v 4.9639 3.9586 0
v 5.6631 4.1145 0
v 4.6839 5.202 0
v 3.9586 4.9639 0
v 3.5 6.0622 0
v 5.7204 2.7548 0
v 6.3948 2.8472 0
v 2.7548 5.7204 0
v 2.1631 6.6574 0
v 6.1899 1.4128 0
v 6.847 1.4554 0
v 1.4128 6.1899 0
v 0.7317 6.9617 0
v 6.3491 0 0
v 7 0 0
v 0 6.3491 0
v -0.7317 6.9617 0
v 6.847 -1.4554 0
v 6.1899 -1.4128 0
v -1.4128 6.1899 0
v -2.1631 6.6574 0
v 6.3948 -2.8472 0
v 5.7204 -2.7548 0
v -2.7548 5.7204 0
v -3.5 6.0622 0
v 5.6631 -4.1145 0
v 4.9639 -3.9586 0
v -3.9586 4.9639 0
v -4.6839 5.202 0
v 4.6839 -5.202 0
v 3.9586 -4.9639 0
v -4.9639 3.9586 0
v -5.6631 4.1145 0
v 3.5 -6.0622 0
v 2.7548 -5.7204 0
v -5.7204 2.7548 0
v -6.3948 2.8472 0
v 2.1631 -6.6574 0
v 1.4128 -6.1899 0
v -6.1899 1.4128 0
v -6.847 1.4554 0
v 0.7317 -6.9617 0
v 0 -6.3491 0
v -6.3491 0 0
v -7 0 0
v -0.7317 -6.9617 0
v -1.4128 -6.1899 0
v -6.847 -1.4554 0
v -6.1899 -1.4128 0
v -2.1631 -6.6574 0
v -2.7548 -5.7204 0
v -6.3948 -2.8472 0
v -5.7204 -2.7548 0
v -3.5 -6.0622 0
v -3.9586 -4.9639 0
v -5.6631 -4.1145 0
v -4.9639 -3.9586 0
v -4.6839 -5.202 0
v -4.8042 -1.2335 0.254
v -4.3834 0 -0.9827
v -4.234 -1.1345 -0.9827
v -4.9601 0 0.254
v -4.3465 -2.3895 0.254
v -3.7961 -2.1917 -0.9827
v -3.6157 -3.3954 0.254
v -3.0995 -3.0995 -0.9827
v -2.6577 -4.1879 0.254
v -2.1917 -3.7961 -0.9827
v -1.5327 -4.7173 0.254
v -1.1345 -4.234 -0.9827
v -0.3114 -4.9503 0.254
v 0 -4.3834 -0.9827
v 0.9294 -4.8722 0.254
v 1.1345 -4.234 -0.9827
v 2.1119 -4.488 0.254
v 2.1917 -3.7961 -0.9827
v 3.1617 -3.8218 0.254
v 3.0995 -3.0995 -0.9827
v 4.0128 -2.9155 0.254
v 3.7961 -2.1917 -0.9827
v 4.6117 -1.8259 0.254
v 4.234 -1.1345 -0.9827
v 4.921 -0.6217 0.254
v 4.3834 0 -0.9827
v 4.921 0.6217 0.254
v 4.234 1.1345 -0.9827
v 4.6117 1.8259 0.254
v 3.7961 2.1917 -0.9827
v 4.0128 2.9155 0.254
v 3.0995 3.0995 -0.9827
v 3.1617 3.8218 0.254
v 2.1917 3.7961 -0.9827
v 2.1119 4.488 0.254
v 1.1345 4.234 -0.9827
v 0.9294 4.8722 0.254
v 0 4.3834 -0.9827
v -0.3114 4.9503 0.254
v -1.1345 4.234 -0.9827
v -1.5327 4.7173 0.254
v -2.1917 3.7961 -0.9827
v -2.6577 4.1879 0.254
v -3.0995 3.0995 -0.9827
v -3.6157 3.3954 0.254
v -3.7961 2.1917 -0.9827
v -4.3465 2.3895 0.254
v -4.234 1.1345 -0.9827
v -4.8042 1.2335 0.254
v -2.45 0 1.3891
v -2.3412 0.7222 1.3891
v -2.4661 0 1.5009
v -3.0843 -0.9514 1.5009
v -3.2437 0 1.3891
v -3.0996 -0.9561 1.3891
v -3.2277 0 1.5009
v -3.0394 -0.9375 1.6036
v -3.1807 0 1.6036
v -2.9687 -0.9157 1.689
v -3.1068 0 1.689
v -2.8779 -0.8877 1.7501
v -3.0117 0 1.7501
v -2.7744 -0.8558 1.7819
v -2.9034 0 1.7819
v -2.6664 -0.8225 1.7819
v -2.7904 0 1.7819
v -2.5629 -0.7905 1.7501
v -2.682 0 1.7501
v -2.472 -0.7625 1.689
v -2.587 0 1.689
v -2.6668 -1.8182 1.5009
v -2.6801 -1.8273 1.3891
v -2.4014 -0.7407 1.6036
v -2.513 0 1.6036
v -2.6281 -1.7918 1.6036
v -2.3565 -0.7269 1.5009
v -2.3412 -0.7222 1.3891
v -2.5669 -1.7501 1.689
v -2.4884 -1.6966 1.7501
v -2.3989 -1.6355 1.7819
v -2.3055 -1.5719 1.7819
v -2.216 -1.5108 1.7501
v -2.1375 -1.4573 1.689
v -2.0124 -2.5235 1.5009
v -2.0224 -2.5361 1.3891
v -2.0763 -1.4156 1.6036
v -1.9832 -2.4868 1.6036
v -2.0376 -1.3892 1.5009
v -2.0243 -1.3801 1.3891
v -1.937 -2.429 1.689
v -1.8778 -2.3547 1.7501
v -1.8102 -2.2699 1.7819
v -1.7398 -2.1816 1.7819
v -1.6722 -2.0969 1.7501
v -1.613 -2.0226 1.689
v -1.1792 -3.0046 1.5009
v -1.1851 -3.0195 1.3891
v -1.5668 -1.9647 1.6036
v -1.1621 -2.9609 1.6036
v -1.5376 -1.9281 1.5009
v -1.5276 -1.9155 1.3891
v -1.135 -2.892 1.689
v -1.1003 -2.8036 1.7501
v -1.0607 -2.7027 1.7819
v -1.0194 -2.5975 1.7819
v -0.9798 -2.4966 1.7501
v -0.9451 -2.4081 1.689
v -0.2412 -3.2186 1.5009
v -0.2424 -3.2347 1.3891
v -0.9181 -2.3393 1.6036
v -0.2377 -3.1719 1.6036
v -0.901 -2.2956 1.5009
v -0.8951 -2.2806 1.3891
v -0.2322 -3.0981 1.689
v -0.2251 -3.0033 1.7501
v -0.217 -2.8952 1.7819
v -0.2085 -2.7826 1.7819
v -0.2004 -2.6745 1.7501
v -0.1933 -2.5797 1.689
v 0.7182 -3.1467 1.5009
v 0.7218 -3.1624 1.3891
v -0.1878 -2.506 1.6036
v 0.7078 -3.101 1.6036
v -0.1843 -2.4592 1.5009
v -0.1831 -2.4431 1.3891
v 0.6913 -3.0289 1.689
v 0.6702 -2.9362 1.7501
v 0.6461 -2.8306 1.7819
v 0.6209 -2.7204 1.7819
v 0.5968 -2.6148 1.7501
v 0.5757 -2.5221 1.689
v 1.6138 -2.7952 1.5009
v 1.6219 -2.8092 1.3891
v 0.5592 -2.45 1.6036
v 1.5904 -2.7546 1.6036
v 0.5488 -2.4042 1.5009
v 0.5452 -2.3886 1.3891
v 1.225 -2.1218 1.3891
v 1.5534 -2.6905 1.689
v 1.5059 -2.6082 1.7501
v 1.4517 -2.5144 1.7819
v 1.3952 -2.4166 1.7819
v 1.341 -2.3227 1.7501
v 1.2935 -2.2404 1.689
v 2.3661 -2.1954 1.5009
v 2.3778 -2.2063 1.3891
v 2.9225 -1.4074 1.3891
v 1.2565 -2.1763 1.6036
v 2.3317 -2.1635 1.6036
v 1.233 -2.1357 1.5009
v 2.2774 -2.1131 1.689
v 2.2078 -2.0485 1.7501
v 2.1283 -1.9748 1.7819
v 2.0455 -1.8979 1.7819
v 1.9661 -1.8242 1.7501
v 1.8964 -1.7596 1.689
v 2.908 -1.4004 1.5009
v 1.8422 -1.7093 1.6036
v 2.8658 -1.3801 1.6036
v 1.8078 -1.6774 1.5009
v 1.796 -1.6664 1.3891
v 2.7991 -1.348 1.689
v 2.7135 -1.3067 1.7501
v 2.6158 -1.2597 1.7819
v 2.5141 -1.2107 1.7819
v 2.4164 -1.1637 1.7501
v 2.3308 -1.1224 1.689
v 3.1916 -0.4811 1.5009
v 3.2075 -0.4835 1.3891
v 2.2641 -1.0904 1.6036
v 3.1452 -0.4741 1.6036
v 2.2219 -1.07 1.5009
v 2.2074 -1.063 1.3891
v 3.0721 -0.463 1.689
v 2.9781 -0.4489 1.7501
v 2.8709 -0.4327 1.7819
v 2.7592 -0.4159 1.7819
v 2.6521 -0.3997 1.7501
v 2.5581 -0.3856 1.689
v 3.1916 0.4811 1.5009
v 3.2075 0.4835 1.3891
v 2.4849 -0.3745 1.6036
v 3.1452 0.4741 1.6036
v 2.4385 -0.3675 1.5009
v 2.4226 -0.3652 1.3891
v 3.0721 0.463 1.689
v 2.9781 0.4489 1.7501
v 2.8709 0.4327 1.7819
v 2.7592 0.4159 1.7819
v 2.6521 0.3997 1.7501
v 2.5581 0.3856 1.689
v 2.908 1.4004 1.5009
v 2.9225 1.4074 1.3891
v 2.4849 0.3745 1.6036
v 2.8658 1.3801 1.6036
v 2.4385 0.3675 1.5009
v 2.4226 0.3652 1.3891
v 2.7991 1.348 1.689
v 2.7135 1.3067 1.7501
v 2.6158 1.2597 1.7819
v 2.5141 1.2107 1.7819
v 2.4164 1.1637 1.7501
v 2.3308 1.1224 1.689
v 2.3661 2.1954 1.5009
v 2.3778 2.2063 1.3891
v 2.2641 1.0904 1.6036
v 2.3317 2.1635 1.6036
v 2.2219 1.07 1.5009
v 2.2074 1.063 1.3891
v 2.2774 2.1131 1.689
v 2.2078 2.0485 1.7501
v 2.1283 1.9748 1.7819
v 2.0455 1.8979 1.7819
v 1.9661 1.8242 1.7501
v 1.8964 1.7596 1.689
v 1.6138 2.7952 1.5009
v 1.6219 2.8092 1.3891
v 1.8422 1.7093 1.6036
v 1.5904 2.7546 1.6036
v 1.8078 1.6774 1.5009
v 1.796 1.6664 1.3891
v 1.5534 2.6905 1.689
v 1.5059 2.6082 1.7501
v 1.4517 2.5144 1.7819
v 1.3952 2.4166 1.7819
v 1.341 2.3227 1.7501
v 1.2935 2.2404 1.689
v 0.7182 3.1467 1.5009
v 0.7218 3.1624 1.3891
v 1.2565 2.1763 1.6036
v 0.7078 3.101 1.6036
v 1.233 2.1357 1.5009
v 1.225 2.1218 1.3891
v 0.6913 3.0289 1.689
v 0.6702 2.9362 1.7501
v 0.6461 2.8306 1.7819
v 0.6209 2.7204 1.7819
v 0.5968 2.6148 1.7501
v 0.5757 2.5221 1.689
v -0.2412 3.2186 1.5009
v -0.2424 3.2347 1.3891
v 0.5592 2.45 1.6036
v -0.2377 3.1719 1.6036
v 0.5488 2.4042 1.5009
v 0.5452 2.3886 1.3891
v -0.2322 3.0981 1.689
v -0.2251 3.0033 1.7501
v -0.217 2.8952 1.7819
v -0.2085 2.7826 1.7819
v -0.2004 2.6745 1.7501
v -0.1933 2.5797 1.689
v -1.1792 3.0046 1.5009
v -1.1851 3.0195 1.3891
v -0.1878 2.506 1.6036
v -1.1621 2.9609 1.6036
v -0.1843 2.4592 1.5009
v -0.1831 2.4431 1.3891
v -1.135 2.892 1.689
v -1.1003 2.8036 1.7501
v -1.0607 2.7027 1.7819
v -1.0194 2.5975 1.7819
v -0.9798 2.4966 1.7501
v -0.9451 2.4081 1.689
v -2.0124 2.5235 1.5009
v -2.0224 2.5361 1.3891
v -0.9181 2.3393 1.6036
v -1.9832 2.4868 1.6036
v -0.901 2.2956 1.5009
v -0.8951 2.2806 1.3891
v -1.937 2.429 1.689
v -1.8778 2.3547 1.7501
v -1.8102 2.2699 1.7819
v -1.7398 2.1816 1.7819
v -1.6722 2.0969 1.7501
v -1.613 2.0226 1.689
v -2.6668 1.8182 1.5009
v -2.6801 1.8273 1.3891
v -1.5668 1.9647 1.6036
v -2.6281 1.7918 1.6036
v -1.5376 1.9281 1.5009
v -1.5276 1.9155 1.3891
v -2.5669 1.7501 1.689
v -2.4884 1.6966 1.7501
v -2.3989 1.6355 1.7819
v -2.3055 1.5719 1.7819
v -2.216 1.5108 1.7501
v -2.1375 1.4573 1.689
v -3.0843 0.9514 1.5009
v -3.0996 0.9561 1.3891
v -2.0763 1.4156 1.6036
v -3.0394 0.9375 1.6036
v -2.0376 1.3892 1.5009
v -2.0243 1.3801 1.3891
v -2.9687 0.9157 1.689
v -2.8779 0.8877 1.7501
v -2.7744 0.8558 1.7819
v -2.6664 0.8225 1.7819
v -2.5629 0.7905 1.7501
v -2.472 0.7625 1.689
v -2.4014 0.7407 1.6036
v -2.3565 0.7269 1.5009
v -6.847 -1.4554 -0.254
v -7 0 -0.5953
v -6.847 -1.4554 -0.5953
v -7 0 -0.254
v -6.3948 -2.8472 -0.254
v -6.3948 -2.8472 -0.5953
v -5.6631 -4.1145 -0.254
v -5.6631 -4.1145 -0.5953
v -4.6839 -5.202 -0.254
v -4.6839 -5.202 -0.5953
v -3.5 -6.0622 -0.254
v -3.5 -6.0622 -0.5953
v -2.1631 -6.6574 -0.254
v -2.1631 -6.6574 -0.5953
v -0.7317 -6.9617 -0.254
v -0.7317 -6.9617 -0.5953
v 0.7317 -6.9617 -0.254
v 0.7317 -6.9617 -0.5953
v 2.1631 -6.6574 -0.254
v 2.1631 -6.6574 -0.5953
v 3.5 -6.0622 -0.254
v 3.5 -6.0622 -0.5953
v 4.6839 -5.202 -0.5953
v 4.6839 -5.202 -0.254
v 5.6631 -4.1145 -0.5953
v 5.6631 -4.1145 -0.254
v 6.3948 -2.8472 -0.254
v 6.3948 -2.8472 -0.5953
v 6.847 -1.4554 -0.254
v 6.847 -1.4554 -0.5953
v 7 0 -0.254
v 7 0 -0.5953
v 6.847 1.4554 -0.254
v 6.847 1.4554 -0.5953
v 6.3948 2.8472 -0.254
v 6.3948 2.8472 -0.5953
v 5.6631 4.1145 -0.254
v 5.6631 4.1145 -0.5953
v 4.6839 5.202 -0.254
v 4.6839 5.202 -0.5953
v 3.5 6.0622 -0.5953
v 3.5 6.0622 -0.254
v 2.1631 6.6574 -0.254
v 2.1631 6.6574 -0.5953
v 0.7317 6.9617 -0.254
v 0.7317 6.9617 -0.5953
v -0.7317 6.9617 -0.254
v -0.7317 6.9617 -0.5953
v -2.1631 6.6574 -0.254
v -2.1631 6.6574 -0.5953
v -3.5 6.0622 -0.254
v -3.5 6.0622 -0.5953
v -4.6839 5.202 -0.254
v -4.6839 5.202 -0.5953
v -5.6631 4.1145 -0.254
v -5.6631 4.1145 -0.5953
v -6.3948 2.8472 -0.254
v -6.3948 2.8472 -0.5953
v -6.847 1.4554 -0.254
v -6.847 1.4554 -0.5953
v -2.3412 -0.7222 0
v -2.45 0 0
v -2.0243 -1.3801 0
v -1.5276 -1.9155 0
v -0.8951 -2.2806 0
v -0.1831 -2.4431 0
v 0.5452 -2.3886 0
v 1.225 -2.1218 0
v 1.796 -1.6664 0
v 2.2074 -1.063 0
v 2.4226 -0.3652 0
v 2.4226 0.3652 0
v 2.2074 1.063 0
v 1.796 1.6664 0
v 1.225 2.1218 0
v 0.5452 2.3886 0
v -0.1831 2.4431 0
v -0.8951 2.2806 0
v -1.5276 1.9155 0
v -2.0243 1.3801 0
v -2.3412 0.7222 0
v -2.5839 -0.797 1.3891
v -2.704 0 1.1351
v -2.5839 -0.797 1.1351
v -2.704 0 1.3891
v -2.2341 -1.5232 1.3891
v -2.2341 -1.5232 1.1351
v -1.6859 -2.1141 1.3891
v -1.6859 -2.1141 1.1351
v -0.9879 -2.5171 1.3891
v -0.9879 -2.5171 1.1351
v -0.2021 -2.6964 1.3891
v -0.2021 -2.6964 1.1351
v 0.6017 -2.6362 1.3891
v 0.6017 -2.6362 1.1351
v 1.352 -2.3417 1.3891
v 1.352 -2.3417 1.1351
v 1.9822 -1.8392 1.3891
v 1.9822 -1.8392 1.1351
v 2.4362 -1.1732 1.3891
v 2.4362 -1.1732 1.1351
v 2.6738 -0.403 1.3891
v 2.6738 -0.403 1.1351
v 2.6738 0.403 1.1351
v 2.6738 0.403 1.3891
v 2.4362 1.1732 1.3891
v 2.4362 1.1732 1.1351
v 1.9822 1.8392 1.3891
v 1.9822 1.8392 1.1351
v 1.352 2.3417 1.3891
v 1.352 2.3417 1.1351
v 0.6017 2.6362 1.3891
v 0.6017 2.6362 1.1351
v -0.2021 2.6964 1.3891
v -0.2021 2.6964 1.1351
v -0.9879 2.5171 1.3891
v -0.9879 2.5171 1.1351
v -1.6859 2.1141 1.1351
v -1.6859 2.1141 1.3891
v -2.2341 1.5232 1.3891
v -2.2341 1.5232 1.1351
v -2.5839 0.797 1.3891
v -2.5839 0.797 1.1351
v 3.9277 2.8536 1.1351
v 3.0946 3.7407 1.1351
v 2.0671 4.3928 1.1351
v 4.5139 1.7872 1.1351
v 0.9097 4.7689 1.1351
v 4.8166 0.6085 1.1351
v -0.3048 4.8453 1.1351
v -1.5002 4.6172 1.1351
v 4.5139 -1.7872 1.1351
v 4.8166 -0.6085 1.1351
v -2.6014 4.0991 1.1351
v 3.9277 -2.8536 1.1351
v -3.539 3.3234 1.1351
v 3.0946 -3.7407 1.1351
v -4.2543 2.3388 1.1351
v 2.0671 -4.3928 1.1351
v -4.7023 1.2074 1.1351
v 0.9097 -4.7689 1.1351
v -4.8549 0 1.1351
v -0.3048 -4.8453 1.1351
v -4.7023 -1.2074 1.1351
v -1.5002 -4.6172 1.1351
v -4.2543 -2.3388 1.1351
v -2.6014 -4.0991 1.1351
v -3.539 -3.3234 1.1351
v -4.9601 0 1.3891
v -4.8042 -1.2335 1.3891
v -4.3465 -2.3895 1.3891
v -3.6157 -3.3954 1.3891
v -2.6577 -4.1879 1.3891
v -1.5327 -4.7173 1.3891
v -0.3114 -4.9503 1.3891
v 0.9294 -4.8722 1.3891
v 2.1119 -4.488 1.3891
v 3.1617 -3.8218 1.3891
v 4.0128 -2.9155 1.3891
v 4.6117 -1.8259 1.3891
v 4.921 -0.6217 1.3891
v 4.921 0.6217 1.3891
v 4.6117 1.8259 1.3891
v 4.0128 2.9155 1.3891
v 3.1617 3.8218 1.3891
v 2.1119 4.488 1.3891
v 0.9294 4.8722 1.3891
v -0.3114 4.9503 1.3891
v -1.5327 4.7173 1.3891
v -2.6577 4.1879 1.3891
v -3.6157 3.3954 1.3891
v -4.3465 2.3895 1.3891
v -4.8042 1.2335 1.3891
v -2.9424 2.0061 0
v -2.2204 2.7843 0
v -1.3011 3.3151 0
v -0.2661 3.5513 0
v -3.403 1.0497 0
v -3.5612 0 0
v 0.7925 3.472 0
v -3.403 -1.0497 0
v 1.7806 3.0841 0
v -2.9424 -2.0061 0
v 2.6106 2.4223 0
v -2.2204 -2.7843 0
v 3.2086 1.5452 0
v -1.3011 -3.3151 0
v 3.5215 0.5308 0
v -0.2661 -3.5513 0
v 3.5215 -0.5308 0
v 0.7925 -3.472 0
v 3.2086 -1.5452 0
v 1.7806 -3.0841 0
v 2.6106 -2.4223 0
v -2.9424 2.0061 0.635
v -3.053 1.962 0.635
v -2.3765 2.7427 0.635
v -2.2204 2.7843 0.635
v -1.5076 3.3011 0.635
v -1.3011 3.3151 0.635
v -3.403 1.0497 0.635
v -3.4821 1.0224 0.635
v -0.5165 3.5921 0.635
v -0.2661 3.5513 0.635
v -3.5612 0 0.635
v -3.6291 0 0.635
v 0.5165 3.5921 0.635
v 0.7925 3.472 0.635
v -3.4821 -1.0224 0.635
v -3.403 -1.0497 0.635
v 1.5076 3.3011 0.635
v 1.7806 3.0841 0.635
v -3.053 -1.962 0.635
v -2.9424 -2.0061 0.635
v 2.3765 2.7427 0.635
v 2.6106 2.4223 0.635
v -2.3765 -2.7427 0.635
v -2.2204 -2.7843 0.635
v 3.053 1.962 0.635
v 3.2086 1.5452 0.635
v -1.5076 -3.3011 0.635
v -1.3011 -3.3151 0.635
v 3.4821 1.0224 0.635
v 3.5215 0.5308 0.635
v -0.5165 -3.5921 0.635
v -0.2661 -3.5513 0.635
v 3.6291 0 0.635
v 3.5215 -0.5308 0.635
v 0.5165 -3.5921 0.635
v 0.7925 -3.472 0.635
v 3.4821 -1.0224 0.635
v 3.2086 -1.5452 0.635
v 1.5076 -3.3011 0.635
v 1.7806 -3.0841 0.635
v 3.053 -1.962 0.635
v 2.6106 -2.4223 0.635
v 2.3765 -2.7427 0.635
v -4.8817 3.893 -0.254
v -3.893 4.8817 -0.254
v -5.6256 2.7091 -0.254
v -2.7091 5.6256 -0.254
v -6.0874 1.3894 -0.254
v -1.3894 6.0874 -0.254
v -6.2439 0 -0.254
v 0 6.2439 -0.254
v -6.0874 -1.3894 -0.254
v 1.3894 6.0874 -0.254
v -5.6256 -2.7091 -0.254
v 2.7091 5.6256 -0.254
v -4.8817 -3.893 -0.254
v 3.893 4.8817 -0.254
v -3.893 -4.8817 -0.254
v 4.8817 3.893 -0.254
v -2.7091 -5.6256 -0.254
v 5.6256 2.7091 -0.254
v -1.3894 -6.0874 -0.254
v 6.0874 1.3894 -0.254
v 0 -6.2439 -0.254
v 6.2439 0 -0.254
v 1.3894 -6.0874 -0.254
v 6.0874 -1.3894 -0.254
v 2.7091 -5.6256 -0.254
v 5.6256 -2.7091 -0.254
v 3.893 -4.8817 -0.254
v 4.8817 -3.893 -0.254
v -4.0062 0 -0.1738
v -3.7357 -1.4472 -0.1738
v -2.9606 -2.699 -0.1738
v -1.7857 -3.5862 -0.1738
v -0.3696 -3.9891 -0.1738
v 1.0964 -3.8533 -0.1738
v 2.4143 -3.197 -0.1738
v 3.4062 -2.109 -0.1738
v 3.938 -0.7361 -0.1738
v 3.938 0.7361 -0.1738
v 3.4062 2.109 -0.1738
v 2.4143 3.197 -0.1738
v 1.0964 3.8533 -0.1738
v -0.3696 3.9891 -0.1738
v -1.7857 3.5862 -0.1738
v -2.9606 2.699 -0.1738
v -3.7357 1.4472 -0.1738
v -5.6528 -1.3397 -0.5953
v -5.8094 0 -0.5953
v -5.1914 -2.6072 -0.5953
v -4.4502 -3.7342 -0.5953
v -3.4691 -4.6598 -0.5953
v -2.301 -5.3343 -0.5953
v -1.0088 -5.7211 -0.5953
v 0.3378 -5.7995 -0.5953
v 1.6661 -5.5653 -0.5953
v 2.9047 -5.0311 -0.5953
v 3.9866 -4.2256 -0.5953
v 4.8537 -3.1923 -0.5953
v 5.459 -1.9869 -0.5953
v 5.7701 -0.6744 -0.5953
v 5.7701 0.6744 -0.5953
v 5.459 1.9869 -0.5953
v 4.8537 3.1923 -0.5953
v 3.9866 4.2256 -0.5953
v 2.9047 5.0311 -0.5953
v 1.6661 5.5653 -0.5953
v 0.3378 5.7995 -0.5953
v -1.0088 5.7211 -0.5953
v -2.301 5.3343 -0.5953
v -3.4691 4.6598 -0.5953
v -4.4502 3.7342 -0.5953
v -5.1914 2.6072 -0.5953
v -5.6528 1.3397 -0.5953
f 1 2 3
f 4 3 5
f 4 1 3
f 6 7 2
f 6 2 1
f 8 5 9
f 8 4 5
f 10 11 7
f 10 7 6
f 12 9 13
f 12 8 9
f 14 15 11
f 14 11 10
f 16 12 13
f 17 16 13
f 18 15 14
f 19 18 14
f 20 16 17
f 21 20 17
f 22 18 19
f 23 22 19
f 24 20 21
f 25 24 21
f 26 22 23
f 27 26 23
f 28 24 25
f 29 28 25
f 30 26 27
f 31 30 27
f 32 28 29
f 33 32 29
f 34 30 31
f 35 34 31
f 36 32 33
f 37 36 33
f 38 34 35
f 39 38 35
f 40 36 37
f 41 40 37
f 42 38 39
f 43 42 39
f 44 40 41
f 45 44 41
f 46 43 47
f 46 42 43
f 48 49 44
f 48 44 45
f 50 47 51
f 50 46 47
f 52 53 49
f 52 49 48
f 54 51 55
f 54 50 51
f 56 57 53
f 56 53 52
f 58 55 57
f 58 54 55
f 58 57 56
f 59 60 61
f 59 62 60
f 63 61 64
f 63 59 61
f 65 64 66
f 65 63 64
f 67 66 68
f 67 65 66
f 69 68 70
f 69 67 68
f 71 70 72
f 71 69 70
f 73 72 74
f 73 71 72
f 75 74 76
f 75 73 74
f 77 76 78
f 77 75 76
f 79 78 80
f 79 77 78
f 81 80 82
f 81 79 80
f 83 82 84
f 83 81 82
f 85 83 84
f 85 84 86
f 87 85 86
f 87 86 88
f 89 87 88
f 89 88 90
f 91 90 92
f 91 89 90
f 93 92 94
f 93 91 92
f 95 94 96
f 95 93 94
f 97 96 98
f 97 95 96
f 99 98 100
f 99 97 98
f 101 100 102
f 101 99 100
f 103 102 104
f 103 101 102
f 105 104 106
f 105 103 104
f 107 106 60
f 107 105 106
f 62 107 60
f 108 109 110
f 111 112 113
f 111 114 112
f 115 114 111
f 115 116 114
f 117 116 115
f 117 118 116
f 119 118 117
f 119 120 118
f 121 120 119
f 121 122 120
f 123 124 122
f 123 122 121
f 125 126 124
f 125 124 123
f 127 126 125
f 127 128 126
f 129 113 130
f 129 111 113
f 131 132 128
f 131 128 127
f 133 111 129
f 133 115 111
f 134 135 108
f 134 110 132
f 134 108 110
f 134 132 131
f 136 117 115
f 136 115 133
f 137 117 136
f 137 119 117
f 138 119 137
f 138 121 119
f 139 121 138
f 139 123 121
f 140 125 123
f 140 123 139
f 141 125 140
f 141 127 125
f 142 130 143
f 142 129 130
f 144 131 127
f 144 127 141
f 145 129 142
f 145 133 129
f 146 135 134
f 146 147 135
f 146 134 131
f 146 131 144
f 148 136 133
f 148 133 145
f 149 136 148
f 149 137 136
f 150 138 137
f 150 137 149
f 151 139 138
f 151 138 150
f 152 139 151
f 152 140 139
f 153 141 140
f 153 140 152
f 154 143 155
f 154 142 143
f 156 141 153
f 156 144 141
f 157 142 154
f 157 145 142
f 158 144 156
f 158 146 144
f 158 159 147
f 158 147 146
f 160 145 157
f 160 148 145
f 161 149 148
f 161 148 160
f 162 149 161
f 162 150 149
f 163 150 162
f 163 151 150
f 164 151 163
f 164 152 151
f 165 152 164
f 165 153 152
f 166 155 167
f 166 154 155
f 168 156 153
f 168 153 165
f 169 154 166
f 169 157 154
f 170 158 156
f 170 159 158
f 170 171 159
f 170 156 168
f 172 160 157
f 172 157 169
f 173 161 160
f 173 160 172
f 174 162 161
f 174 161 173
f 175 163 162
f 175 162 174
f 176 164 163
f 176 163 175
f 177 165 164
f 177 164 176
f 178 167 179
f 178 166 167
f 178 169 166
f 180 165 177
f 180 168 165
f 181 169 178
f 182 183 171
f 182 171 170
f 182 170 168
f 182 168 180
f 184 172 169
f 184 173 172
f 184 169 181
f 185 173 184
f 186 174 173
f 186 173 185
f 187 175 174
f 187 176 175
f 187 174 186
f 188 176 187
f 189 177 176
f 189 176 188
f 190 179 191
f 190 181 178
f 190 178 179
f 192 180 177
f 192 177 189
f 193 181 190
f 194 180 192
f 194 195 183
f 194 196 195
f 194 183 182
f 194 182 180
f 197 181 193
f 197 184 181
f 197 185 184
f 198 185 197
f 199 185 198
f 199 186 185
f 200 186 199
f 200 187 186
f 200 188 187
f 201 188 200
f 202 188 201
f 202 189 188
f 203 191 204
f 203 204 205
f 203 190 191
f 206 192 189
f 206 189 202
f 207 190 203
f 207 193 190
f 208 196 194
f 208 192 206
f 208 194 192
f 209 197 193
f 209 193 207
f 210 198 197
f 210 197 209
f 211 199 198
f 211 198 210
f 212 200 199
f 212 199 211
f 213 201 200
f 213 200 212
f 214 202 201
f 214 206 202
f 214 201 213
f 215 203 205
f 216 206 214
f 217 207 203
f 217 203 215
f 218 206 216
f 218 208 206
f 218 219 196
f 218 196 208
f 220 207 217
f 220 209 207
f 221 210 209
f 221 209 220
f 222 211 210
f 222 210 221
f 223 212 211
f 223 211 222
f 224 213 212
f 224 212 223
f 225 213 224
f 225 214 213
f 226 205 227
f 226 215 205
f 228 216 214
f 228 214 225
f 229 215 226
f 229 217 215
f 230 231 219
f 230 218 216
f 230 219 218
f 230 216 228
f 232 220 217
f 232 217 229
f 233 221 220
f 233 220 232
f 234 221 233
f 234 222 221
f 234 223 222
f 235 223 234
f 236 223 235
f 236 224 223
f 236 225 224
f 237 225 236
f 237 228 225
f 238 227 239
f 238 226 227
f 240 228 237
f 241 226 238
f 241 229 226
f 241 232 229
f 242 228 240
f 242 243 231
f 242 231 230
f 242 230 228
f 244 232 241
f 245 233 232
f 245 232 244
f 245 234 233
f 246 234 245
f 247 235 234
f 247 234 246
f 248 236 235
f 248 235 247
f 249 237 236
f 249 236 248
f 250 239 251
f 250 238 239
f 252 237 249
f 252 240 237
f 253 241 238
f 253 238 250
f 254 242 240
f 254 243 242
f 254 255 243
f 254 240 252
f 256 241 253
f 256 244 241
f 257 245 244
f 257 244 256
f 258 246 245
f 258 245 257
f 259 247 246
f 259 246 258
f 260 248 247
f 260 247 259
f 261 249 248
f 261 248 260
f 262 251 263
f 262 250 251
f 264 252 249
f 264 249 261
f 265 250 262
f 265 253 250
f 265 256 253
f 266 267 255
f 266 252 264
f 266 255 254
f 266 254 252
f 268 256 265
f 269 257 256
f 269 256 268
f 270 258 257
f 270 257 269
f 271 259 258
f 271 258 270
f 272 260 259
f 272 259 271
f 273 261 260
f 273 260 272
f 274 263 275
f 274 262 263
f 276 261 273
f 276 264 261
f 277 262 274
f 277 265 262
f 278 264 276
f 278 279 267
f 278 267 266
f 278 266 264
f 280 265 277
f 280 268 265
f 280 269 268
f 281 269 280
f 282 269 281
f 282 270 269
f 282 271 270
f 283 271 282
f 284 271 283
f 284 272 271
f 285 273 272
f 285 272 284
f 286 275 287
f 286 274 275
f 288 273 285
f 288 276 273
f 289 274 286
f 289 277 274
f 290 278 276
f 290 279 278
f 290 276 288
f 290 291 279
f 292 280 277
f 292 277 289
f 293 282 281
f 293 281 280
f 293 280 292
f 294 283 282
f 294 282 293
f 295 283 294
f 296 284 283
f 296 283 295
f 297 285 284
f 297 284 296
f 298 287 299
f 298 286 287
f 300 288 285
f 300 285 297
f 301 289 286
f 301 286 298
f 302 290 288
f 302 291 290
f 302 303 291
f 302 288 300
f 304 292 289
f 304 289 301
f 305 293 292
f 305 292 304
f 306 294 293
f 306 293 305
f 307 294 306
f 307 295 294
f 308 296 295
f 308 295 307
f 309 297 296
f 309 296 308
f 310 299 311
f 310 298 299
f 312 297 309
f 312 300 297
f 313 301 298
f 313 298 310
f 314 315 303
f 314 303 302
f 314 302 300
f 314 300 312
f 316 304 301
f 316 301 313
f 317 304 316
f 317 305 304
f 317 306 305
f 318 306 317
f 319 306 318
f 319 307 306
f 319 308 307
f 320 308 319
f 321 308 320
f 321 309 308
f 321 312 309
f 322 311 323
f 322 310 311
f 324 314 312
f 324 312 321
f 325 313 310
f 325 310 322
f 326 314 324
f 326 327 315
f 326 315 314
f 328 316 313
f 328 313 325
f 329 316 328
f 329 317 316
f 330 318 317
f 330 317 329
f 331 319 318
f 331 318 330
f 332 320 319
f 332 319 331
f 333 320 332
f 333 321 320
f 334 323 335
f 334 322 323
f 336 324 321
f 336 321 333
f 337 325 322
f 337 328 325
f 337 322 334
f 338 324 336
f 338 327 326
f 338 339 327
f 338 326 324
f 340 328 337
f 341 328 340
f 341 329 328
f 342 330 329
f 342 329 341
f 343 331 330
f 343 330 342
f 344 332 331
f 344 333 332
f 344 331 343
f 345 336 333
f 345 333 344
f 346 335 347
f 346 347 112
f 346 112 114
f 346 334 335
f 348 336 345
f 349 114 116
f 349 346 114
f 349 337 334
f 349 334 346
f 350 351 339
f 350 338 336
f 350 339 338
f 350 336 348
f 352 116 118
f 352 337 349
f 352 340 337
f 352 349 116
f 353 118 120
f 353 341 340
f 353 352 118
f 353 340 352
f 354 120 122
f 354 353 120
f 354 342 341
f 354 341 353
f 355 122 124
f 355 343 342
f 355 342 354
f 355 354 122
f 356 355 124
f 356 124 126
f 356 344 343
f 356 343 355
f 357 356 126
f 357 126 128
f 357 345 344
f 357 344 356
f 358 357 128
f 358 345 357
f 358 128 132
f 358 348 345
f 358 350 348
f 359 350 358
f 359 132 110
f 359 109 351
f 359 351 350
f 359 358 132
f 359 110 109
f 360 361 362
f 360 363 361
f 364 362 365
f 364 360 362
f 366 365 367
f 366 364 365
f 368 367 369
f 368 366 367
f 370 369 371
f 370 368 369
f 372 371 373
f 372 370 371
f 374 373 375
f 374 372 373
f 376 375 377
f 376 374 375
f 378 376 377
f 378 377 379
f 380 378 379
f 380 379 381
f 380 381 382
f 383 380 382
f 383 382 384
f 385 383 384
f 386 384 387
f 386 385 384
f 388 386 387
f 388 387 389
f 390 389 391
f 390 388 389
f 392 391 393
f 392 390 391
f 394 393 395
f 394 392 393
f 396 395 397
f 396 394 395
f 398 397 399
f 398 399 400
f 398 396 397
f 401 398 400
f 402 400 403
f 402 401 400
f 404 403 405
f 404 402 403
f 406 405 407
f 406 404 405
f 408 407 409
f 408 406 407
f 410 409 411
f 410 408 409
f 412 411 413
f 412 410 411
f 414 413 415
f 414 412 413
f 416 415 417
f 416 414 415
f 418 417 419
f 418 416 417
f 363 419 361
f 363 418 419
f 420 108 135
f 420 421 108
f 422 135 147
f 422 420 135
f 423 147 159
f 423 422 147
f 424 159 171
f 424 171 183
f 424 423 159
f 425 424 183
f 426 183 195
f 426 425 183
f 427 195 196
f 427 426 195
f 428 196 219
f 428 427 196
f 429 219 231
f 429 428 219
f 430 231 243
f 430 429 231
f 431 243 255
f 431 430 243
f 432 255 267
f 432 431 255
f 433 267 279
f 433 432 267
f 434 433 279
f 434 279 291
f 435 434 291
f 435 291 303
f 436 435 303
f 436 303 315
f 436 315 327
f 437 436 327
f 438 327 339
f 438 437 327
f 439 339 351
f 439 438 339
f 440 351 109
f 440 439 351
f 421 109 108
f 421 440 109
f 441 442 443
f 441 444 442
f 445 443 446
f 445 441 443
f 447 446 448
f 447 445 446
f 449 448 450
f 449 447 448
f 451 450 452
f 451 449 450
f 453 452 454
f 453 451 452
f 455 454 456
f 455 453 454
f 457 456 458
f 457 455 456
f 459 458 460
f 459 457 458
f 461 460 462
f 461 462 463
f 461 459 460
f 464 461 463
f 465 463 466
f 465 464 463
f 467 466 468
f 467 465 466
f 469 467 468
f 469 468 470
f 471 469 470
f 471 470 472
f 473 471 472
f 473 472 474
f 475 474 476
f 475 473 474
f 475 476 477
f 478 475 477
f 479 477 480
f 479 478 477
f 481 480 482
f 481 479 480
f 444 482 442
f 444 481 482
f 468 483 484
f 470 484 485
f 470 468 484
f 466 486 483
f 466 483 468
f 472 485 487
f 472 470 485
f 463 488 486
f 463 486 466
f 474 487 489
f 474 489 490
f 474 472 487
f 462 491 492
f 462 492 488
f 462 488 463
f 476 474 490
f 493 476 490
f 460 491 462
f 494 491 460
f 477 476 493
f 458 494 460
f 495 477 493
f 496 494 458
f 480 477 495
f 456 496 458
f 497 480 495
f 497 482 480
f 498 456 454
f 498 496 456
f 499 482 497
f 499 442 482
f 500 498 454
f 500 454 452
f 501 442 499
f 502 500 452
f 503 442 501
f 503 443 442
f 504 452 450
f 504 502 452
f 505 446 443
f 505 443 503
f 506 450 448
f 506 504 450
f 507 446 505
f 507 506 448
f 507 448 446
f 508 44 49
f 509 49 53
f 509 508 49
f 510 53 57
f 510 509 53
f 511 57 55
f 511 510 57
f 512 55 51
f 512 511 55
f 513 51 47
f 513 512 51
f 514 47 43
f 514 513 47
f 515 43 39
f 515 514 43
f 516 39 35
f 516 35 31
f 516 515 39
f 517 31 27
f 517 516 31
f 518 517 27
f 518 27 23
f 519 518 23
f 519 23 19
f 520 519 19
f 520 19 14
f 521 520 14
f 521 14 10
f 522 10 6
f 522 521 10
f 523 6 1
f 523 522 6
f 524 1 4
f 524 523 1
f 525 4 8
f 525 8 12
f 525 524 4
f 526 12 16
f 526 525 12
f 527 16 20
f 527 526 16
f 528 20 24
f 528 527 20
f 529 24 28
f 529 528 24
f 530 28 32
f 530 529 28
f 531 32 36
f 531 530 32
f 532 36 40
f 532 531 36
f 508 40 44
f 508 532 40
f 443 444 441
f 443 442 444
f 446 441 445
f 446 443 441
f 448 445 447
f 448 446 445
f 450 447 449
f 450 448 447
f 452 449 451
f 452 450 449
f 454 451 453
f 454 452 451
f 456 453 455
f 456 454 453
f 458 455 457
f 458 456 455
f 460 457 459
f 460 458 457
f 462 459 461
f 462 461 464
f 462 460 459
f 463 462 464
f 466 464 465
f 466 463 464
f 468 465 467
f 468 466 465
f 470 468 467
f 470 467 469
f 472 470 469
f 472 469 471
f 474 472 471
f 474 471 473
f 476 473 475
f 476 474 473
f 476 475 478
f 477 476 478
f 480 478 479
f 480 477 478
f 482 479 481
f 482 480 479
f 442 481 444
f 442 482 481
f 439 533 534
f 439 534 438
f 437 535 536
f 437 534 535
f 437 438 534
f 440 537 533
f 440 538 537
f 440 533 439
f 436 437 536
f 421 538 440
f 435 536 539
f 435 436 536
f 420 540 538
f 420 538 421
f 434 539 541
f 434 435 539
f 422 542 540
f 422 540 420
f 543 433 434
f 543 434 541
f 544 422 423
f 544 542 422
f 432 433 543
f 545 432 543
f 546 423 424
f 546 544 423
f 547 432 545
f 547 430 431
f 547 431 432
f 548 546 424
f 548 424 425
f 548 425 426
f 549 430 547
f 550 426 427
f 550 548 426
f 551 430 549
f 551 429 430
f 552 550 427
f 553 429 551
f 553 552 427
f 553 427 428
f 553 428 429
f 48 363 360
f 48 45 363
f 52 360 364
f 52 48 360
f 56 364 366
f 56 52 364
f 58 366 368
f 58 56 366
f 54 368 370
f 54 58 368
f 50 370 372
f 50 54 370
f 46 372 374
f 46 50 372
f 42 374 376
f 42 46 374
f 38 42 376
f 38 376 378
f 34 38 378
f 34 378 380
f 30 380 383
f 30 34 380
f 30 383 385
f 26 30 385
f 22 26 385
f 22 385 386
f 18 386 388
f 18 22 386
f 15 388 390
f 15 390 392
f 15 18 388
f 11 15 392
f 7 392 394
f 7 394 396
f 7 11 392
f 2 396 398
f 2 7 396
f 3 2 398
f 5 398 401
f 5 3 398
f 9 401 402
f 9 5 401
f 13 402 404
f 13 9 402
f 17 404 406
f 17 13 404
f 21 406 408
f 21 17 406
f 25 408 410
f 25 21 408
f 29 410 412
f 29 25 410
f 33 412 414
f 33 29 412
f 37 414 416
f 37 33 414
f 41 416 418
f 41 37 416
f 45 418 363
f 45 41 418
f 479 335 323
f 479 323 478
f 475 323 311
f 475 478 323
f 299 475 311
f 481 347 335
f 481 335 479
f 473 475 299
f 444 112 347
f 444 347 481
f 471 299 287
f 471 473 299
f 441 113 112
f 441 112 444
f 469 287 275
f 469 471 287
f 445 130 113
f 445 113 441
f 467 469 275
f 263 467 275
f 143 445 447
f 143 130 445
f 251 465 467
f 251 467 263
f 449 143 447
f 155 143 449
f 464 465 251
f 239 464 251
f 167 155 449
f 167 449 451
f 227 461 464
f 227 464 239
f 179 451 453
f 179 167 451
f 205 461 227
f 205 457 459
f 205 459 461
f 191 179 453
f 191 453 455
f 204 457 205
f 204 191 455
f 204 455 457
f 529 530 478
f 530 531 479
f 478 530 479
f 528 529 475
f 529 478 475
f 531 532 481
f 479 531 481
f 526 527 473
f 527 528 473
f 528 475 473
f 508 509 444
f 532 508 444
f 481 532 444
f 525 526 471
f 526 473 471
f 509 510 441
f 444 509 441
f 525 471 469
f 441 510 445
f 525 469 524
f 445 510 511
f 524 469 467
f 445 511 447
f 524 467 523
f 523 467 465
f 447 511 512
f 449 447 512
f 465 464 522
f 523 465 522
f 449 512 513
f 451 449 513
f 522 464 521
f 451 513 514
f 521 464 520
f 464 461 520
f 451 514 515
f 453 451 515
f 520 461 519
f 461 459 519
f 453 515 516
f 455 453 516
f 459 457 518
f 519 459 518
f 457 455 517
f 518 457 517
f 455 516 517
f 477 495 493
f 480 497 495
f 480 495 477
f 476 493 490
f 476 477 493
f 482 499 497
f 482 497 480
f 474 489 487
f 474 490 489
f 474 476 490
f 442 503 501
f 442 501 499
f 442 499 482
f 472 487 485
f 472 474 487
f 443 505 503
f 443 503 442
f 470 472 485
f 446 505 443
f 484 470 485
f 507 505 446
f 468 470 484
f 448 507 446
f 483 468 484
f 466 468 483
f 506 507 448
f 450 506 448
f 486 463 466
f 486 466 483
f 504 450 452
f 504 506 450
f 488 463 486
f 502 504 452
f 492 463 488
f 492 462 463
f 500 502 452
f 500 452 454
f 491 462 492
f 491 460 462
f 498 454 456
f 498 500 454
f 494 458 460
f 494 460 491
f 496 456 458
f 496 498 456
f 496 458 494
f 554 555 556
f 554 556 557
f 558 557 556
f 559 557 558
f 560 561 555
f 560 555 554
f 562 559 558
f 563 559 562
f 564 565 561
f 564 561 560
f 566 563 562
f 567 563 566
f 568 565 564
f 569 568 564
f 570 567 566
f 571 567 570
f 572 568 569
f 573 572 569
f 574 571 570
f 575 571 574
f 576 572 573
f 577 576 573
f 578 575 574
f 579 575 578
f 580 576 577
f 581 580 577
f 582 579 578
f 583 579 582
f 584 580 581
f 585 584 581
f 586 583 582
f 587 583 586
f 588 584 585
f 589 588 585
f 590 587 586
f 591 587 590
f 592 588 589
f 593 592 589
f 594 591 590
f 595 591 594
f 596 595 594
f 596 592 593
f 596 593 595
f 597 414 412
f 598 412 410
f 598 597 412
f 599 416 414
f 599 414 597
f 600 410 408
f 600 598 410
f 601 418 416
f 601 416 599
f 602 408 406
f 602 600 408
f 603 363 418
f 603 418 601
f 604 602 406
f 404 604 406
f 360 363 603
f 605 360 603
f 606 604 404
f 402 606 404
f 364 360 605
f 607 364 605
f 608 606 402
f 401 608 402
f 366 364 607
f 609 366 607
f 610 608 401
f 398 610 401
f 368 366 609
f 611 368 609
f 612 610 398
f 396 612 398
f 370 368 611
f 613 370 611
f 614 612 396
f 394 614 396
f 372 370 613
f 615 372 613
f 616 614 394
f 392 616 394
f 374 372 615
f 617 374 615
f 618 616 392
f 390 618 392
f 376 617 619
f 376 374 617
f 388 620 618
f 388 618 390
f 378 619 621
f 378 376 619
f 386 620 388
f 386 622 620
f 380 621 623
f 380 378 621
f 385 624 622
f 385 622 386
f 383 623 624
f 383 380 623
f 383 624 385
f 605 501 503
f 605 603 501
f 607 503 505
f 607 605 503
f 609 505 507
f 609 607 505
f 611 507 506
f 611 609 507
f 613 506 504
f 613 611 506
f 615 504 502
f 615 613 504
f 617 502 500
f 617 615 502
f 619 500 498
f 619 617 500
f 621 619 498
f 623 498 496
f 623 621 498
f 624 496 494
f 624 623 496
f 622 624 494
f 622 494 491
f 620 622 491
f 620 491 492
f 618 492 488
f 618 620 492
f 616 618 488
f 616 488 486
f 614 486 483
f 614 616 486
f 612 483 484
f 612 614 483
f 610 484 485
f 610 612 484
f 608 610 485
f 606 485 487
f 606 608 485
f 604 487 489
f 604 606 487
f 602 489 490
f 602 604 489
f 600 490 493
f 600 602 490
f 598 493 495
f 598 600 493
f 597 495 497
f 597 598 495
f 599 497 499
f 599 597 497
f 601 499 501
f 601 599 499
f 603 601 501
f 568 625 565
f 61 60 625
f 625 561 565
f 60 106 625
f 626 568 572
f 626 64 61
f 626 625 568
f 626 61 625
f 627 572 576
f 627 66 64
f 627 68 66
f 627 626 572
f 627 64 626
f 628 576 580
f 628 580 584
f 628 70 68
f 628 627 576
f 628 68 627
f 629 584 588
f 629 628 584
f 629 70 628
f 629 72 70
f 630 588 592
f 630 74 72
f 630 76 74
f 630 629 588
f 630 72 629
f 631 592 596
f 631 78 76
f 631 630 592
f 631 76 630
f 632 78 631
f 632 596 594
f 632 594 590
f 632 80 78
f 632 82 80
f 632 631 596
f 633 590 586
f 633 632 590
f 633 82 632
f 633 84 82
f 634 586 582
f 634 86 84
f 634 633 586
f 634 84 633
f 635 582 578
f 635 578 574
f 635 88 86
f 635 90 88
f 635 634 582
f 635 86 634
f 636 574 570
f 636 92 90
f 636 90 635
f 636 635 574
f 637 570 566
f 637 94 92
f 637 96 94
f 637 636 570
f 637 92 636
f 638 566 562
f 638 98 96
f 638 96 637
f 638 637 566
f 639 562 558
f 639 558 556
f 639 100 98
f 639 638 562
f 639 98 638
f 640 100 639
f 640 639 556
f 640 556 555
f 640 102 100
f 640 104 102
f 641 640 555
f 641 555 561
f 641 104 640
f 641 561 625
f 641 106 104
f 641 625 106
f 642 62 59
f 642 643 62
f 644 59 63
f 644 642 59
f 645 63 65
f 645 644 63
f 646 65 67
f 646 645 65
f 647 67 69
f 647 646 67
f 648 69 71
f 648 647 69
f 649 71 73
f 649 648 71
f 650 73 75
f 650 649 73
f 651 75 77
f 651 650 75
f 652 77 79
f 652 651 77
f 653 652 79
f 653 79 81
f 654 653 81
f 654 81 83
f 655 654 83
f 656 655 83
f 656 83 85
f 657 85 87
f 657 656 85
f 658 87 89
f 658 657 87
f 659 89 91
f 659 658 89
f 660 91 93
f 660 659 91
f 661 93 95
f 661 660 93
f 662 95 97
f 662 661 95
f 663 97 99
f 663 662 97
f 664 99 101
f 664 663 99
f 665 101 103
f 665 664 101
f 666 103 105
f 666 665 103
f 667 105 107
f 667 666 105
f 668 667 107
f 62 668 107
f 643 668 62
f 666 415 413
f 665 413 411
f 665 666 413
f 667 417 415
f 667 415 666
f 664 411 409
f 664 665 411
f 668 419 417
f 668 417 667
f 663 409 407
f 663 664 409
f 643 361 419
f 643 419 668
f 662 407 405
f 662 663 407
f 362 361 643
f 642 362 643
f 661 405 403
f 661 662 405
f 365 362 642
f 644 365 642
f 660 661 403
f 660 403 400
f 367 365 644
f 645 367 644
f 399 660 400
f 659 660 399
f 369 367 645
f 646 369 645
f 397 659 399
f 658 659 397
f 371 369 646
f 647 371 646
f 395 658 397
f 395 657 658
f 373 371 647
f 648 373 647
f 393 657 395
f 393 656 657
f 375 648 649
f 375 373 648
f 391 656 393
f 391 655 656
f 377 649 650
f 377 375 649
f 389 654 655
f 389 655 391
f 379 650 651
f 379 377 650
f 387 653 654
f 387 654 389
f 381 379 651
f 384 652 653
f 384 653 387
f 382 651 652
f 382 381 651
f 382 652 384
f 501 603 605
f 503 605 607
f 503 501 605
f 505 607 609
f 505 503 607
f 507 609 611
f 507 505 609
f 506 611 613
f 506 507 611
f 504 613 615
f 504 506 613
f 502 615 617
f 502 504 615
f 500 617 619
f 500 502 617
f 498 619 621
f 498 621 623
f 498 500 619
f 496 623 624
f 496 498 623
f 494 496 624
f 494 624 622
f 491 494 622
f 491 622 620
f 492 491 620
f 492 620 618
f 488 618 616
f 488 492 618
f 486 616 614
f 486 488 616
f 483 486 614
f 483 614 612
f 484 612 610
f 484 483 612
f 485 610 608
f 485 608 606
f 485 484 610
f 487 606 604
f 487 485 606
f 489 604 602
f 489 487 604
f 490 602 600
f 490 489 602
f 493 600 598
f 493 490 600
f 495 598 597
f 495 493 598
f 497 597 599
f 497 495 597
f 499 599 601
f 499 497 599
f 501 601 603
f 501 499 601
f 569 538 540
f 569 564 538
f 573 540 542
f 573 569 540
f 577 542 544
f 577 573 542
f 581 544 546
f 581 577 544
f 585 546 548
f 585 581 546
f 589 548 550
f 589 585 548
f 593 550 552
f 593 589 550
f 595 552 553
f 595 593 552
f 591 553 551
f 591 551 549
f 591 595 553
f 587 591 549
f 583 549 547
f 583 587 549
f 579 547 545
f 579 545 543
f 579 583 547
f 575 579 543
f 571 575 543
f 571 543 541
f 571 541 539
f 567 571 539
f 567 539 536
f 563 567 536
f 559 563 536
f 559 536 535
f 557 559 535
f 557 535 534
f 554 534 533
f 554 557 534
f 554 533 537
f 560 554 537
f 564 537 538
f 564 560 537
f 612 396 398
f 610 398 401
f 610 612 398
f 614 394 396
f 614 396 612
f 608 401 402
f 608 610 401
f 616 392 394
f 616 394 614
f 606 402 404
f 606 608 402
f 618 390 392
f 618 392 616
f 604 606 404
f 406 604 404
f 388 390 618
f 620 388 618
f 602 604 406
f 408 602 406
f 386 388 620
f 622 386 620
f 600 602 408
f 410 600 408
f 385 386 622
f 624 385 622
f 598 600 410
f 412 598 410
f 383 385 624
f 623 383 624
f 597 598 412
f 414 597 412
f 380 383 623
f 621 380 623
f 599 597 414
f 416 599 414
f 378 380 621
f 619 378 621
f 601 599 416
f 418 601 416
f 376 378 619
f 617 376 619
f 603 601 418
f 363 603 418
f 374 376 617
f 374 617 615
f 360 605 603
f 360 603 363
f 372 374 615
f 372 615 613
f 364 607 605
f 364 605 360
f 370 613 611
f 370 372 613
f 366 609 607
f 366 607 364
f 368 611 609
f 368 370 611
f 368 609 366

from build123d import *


with BuildPart() as part:
    # Sketch2 → Revolve1 (revolve)
    with BuildSketch(Plane(origin=(0, 0, 0), x_dir=(1, 0, 0), z_dir=(0, 1, 0))):
        Polygon((3.24375, -1.3890625), (2.704, -1.3890625), (2.704, -1.1350625), (4.854852255, -1.1350625), (6.243914755, 0.254), (7, 0.254), (7, 0), (6.349125, 0), (4.9600625, -1.3890625), align=None)
    revolve(axis=Axis((0, 0, -2.0850225), (0, 0, 1)))


with BuildPart() as body_2:
    # Sketch3 → Revolve2 (revolve)
    with BuildSketch(Plane(origin=(0, 0, 0), x_dir=(1, 0, 0), z_dir=(0, 1, 0))):
        with BuildLine():
            Line((2.45, -1.3890625), (2.45, 0))
            Line((2.45, 0), (3.56125, 0))
            Line((3.56125, 0), (3.56125, -0.635))
            Line((3.56125, -0.635), (3.629068894, -0.635))
            Line((3.629068894, -0.635), (4.383397306, 0.9826625))
            Line((4.383397306, 0.9826625), (4.9600625, -0.254))
            Line((4.9600625, -0.254), (5.809375, 0.5953125))
            Line((5.809375, 0.5953125), (7, 0.5953125))
            Line((7, 0.5953125), (7, 0.254))
            Line((7, 0.254), (6.243914755, 0.254))
            Line((6.243914755, 0.254), (4.854852255, -1.1350625))
            Line((4.854852255, -1.1350625), (2.704, -1.1350625))
            Line((2.704, -1.1350625), (2.704, -1.3890625))
            Line((2.704, -1.3890625), (3.24375, -1.3890625))
            ThreePointArc((3.24375, -1.3890625), (2.846875, -1.7859375), (2.45, -1.3890625))
        make_face()
    revolve(axis=Axis((0, 0, -2.0850225), (0, 0, 1)))


solid = Compound([part.part, body_2.part])
